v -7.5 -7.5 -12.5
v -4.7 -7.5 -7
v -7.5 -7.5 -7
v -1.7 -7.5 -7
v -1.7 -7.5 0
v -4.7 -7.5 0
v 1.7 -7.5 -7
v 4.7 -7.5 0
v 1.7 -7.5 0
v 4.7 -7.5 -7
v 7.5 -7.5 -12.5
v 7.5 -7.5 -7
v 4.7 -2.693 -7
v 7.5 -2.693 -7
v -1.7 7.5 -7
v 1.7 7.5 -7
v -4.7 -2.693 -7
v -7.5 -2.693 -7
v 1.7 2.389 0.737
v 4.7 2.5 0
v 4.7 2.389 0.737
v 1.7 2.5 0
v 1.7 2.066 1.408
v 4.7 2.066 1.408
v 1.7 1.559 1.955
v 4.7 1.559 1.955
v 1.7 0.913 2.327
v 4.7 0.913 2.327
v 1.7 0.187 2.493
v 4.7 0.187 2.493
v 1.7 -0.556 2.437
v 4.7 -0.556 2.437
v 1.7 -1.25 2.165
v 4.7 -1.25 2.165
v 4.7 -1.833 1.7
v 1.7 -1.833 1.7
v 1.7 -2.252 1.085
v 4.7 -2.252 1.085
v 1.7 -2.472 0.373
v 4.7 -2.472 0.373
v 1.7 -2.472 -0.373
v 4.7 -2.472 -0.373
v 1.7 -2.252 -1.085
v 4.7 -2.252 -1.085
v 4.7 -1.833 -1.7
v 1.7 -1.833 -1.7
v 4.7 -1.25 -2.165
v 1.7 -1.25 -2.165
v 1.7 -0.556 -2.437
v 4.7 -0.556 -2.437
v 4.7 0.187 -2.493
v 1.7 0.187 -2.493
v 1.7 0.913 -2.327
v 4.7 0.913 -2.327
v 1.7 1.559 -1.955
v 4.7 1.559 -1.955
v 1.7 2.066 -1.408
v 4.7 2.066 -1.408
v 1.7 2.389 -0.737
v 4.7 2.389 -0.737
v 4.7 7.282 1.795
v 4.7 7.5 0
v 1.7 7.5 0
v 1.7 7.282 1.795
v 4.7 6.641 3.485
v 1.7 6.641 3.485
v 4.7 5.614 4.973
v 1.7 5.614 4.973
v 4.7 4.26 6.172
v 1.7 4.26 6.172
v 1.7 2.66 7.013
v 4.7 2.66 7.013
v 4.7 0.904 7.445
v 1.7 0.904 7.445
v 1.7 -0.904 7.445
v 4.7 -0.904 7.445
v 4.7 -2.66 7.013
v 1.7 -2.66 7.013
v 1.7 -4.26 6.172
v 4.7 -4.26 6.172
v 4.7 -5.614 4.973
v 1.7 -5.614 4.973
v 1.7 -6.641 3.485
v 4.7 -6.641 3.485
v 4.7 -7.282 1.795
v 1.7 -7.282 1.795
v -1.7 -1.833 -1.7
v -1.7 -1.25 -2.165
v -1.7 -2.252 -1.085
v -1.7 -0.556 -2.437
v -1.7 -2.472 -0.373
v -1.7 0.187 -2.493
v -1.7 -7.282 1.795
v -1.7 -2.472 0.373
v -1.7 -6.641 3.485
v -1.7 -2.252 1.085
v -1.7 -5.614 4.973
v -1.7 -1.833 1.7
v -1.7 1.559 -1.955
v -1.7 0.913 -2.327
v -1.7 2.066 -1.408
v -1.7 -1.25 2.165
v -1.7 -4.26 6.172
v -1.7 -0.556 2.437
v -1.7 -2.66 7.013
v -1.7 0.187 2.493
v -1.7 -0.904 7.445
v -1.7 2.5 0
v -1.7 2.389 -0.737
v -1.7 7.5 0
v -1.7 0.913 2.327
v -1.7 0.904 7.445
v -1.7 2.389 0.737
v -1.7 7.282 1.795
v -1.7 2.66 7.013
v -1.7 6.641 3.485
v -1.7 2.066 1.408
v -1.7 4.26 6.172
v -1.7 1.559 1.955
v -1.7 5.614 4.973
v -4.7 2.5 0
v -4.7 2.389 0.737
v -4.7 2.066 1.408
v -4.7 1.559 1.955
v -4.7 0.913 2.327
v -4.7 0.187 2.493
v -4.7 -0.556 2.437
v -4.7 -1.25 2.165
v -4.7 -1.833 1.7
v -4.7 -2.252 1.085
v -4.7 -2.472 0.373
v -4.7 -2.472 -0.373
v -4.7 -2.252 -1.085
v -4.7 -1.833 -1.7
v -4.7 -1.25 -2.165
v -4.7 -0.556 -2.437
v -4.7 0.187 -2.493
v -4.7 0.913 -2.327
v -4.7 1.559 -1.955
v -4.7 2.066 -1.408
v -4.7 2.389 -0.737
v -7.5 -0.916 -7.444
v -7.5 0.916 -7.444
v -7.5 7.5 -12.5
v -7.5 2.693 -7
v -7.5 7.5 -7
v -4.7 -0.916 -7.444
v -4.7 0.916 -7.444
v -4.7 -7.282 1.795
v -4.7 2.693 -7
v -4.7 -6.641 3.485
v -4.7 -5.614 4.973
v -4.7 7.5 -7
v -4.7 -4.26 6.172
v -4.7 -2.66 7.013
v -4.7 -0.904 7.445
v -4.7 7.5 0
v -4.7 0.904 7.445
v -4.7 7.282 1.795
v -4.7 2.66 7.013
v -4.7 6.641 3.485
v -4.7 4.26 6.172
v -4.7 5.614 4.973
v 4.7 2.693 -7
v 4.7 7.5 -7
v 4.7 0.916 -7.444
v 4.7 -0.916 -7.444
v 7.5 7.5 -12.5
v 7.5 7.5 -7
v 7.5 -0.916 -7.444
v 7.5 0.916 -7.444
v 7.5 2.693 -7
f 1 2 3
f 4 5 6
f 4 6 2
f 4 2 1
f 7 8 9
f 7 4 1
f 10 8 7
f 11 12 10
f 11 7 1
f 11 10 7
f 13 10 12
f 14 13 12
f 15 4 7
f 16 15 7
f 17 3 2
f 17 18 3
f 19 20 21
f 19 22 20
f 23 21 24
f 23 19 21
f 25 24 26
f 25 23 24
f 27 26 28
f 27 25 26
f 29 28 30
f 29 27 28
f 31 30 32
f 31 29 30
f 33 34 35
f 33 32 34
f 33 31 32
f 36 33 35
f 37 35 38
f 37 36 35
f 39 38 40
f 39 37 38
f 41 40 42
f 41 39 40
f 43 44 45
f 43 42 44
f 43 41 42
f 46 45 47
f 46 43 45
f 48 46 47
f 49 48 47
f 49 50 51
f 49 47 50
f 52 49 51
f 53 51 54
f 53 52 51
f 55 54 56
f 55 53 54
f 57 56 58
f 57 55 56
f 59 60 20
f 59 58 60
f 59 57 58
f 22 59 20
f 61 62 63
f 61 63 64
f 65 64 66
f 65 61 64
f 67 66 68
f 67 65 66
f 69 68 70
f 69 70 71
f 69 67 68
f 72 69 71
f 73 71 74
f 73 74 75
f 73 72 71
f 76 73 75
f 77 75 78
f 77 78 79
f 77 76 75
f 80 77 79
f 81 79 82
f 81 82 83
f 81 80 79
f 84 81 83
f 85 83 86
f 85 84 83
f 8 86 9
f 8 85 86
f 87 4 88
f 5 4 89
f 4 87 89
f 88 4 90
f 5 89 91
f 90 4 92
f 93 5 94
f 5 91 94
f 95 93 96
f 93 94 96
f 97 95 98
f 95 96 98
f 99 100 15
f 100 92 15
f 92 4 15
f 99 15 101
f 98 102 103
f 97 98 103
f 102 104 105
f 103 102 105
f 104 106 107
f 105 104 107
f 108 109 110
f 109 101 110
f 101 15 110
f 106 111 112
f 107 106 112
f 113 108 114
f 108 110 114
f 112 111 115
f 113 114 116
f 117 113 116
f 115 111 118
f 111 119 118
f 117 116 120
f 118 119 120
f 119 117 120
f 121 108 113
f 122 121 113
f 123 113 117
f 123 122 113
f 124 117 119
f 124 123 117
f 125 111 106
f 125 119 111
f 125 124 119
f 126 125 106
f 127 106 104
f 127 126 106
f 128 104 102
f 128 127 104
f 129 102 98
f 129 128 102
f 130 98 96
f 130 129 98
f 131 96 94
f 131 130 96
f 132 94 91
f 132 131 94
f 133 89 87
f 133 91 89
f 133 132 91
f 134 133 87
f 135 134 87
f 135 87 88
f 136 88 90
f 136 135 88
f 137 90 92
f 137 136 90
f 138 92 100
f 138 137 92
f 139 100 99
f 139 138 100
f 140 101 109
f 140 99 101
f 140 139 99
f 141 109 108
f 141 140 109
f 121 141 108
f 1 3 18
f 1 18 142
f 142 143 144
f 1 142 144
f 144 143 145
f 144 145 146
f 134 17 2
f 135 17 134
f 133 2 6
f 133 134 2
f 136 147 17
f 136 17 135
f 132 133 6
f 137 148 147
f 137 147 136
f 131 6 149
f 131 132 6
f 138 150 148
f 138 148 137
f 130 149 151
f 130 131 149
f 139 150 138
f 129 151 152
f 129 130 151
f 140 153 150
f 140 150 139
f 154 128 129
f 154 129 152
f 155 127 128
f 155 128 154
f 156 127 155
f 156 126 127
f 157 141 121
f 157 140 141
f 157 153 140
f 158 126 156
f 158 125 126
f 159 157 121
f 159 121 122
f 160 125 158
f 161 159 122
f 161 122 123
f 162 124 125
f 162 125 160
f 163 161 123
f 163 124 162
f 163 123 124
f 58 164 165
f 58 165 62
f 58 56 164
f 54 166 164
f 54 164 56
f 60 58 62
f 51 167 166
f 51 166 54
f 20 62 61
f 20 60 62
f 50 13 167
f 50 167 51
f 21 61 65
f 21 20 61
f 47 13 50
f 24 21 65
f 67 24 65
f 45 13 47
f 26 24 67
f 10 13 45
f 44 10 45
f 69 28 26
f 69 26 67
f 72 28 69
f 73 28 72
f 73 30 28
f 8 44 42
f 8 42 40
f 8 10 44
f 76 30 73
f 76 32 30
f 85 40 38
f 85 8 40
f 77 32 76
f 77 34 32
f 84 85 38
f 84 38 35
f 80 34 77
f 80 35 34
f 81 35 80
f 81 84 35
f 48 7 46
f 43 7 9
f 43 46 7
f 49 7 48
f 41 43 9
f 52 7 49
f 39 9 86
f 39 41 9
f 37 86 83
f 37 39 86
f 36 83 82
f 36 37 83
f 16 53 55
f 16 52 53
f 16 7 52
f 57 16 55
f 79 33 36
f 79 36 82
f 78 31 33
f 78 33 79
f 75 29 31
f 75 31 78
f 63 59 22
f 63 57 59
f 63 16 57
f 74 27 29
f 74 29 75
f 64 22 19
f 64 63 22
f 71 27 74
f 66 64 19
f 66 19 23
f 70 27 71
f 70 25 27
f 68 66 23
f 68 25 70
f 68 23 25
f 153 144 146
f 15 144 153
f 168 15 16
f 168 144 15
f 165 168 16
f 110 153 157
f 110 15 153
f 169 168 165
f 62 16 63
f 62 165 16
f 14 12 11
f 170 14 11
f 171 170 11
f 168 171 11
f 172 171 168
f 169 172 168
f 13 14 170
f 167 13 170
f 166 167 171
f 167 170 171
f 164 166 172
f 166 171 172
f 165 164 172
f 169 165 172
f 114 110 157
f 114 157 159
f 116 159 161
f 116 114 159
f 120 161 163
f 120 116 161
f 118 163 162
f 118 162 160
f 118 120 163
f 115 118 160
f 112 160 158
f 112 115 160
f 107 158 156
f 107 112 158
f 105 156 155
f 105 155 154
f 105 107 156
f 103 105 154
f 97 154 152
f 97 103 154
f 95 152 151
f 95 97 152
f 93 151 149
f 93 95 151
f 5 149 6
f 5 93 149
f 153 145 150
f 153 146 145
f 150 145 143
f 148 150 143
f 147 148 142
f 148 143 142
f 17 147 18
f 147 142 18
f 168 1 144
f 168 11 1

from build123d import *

# Parameters (mm, degrees)
F0_R     = 2.5
F1_DEPTH = 7.5
F2_W     = 3.4
F2_H     = 15.4505071864
F2_W_2   = 3.8797123611
F2_W_3   = 3.8316924378
F3_DEPTH = 16.41578
F5_DEPTH = 2.8
F7_DEPTH = 2.8


with BuildPart() as f1:
    # F0 (on Right) → F1 (new body, symmetric)
    with BuildSketch(Plane.YZ):
        with BuildLine():
            Line((7.5, -12.5), (7.5, 0))
            ThreePointArc((7.5, 0), (0, 7.5), (-7.5, 0))
            Line((-7.5, 0), (-7.5, -12.5))
            Line((-7.5, -12.5), (7.5, -12.5))
        make_face()
        Circle(F0_R, mode=Mode.SUBTRACT)
    extrude(amount=F1_DEPTH, both=True)

    # F2 (on Front) → F3 (cut, symmetric)
    with BuildSketch(Plane.XZ):
        with Locations((0, 0.7252535932)):
            Rectangle(F2_W, F2_H)
        with Locations((-6.6398561805, 0.7252535932)):
            Rectangle(F2_W_2, F2_H)
        with Locations((6.6158462189, 0.7252535932)):
            Rectangle(F2_W_3, F2_H)
    extrude(amount=F3_DEPTH, both=True, mode=Mode.SUBTRACT)

    # F4 (on face) → F5 (cut, through all)
    with BuildSketch(Plane(origin=(-7.5, 0, 0), x_dir=(0, -1, 0), z_dir=(-1, 0, 0))):
        with BuildLine():
            ThreePointArc((2.6925824036, -7), (6.1824092402, -4.2459175671), (7.5, 0))
            ThreePointArc((7.5, 0), (-4.2459175671, 6.1824092402), (-2.6925824036, -7))
            Line((-2.6925824036, -7), (2.6925824036, -7))
        make_face()
        with BuildLine():
            Line((2.6925824036, -7), (-2.6925824036, -7))
            ThreePointArc((-2.6925824036, -7), (0, -7.5), (2.6925824036, -7))
        make_face()
    extrude(amount=-F5_DEPTH, mode=Mode.SUBTRACT)

    # F6 (on face) → F7 (cut, through all)
    with BuildSketch(Plane.YZ.offset(7.5)):
        with BuildLine():
            Line((2.6925824036, -7), (-2.6925824036, -7))
            ThreePointArc((-2.6925824036, -7), (0, -7.5), (2.6925824036, -7))
        make_face()
        with BuildLine():
            ThreePointArc((2.6925824036, -7), (6.1824092402, -4.2459175671), (7.5, 0))
            ThreePointArc((7.5, 0), (-4.2459175671, 6.1824092402), (-2.6925824036, -7))
            Line((-2.6925824036, -7), (2.6925824036, -7))
        make_face()
    extrude(amount=-F7_DEPTH, mode=Mode.SUBTRACT)


solid = f1.part
